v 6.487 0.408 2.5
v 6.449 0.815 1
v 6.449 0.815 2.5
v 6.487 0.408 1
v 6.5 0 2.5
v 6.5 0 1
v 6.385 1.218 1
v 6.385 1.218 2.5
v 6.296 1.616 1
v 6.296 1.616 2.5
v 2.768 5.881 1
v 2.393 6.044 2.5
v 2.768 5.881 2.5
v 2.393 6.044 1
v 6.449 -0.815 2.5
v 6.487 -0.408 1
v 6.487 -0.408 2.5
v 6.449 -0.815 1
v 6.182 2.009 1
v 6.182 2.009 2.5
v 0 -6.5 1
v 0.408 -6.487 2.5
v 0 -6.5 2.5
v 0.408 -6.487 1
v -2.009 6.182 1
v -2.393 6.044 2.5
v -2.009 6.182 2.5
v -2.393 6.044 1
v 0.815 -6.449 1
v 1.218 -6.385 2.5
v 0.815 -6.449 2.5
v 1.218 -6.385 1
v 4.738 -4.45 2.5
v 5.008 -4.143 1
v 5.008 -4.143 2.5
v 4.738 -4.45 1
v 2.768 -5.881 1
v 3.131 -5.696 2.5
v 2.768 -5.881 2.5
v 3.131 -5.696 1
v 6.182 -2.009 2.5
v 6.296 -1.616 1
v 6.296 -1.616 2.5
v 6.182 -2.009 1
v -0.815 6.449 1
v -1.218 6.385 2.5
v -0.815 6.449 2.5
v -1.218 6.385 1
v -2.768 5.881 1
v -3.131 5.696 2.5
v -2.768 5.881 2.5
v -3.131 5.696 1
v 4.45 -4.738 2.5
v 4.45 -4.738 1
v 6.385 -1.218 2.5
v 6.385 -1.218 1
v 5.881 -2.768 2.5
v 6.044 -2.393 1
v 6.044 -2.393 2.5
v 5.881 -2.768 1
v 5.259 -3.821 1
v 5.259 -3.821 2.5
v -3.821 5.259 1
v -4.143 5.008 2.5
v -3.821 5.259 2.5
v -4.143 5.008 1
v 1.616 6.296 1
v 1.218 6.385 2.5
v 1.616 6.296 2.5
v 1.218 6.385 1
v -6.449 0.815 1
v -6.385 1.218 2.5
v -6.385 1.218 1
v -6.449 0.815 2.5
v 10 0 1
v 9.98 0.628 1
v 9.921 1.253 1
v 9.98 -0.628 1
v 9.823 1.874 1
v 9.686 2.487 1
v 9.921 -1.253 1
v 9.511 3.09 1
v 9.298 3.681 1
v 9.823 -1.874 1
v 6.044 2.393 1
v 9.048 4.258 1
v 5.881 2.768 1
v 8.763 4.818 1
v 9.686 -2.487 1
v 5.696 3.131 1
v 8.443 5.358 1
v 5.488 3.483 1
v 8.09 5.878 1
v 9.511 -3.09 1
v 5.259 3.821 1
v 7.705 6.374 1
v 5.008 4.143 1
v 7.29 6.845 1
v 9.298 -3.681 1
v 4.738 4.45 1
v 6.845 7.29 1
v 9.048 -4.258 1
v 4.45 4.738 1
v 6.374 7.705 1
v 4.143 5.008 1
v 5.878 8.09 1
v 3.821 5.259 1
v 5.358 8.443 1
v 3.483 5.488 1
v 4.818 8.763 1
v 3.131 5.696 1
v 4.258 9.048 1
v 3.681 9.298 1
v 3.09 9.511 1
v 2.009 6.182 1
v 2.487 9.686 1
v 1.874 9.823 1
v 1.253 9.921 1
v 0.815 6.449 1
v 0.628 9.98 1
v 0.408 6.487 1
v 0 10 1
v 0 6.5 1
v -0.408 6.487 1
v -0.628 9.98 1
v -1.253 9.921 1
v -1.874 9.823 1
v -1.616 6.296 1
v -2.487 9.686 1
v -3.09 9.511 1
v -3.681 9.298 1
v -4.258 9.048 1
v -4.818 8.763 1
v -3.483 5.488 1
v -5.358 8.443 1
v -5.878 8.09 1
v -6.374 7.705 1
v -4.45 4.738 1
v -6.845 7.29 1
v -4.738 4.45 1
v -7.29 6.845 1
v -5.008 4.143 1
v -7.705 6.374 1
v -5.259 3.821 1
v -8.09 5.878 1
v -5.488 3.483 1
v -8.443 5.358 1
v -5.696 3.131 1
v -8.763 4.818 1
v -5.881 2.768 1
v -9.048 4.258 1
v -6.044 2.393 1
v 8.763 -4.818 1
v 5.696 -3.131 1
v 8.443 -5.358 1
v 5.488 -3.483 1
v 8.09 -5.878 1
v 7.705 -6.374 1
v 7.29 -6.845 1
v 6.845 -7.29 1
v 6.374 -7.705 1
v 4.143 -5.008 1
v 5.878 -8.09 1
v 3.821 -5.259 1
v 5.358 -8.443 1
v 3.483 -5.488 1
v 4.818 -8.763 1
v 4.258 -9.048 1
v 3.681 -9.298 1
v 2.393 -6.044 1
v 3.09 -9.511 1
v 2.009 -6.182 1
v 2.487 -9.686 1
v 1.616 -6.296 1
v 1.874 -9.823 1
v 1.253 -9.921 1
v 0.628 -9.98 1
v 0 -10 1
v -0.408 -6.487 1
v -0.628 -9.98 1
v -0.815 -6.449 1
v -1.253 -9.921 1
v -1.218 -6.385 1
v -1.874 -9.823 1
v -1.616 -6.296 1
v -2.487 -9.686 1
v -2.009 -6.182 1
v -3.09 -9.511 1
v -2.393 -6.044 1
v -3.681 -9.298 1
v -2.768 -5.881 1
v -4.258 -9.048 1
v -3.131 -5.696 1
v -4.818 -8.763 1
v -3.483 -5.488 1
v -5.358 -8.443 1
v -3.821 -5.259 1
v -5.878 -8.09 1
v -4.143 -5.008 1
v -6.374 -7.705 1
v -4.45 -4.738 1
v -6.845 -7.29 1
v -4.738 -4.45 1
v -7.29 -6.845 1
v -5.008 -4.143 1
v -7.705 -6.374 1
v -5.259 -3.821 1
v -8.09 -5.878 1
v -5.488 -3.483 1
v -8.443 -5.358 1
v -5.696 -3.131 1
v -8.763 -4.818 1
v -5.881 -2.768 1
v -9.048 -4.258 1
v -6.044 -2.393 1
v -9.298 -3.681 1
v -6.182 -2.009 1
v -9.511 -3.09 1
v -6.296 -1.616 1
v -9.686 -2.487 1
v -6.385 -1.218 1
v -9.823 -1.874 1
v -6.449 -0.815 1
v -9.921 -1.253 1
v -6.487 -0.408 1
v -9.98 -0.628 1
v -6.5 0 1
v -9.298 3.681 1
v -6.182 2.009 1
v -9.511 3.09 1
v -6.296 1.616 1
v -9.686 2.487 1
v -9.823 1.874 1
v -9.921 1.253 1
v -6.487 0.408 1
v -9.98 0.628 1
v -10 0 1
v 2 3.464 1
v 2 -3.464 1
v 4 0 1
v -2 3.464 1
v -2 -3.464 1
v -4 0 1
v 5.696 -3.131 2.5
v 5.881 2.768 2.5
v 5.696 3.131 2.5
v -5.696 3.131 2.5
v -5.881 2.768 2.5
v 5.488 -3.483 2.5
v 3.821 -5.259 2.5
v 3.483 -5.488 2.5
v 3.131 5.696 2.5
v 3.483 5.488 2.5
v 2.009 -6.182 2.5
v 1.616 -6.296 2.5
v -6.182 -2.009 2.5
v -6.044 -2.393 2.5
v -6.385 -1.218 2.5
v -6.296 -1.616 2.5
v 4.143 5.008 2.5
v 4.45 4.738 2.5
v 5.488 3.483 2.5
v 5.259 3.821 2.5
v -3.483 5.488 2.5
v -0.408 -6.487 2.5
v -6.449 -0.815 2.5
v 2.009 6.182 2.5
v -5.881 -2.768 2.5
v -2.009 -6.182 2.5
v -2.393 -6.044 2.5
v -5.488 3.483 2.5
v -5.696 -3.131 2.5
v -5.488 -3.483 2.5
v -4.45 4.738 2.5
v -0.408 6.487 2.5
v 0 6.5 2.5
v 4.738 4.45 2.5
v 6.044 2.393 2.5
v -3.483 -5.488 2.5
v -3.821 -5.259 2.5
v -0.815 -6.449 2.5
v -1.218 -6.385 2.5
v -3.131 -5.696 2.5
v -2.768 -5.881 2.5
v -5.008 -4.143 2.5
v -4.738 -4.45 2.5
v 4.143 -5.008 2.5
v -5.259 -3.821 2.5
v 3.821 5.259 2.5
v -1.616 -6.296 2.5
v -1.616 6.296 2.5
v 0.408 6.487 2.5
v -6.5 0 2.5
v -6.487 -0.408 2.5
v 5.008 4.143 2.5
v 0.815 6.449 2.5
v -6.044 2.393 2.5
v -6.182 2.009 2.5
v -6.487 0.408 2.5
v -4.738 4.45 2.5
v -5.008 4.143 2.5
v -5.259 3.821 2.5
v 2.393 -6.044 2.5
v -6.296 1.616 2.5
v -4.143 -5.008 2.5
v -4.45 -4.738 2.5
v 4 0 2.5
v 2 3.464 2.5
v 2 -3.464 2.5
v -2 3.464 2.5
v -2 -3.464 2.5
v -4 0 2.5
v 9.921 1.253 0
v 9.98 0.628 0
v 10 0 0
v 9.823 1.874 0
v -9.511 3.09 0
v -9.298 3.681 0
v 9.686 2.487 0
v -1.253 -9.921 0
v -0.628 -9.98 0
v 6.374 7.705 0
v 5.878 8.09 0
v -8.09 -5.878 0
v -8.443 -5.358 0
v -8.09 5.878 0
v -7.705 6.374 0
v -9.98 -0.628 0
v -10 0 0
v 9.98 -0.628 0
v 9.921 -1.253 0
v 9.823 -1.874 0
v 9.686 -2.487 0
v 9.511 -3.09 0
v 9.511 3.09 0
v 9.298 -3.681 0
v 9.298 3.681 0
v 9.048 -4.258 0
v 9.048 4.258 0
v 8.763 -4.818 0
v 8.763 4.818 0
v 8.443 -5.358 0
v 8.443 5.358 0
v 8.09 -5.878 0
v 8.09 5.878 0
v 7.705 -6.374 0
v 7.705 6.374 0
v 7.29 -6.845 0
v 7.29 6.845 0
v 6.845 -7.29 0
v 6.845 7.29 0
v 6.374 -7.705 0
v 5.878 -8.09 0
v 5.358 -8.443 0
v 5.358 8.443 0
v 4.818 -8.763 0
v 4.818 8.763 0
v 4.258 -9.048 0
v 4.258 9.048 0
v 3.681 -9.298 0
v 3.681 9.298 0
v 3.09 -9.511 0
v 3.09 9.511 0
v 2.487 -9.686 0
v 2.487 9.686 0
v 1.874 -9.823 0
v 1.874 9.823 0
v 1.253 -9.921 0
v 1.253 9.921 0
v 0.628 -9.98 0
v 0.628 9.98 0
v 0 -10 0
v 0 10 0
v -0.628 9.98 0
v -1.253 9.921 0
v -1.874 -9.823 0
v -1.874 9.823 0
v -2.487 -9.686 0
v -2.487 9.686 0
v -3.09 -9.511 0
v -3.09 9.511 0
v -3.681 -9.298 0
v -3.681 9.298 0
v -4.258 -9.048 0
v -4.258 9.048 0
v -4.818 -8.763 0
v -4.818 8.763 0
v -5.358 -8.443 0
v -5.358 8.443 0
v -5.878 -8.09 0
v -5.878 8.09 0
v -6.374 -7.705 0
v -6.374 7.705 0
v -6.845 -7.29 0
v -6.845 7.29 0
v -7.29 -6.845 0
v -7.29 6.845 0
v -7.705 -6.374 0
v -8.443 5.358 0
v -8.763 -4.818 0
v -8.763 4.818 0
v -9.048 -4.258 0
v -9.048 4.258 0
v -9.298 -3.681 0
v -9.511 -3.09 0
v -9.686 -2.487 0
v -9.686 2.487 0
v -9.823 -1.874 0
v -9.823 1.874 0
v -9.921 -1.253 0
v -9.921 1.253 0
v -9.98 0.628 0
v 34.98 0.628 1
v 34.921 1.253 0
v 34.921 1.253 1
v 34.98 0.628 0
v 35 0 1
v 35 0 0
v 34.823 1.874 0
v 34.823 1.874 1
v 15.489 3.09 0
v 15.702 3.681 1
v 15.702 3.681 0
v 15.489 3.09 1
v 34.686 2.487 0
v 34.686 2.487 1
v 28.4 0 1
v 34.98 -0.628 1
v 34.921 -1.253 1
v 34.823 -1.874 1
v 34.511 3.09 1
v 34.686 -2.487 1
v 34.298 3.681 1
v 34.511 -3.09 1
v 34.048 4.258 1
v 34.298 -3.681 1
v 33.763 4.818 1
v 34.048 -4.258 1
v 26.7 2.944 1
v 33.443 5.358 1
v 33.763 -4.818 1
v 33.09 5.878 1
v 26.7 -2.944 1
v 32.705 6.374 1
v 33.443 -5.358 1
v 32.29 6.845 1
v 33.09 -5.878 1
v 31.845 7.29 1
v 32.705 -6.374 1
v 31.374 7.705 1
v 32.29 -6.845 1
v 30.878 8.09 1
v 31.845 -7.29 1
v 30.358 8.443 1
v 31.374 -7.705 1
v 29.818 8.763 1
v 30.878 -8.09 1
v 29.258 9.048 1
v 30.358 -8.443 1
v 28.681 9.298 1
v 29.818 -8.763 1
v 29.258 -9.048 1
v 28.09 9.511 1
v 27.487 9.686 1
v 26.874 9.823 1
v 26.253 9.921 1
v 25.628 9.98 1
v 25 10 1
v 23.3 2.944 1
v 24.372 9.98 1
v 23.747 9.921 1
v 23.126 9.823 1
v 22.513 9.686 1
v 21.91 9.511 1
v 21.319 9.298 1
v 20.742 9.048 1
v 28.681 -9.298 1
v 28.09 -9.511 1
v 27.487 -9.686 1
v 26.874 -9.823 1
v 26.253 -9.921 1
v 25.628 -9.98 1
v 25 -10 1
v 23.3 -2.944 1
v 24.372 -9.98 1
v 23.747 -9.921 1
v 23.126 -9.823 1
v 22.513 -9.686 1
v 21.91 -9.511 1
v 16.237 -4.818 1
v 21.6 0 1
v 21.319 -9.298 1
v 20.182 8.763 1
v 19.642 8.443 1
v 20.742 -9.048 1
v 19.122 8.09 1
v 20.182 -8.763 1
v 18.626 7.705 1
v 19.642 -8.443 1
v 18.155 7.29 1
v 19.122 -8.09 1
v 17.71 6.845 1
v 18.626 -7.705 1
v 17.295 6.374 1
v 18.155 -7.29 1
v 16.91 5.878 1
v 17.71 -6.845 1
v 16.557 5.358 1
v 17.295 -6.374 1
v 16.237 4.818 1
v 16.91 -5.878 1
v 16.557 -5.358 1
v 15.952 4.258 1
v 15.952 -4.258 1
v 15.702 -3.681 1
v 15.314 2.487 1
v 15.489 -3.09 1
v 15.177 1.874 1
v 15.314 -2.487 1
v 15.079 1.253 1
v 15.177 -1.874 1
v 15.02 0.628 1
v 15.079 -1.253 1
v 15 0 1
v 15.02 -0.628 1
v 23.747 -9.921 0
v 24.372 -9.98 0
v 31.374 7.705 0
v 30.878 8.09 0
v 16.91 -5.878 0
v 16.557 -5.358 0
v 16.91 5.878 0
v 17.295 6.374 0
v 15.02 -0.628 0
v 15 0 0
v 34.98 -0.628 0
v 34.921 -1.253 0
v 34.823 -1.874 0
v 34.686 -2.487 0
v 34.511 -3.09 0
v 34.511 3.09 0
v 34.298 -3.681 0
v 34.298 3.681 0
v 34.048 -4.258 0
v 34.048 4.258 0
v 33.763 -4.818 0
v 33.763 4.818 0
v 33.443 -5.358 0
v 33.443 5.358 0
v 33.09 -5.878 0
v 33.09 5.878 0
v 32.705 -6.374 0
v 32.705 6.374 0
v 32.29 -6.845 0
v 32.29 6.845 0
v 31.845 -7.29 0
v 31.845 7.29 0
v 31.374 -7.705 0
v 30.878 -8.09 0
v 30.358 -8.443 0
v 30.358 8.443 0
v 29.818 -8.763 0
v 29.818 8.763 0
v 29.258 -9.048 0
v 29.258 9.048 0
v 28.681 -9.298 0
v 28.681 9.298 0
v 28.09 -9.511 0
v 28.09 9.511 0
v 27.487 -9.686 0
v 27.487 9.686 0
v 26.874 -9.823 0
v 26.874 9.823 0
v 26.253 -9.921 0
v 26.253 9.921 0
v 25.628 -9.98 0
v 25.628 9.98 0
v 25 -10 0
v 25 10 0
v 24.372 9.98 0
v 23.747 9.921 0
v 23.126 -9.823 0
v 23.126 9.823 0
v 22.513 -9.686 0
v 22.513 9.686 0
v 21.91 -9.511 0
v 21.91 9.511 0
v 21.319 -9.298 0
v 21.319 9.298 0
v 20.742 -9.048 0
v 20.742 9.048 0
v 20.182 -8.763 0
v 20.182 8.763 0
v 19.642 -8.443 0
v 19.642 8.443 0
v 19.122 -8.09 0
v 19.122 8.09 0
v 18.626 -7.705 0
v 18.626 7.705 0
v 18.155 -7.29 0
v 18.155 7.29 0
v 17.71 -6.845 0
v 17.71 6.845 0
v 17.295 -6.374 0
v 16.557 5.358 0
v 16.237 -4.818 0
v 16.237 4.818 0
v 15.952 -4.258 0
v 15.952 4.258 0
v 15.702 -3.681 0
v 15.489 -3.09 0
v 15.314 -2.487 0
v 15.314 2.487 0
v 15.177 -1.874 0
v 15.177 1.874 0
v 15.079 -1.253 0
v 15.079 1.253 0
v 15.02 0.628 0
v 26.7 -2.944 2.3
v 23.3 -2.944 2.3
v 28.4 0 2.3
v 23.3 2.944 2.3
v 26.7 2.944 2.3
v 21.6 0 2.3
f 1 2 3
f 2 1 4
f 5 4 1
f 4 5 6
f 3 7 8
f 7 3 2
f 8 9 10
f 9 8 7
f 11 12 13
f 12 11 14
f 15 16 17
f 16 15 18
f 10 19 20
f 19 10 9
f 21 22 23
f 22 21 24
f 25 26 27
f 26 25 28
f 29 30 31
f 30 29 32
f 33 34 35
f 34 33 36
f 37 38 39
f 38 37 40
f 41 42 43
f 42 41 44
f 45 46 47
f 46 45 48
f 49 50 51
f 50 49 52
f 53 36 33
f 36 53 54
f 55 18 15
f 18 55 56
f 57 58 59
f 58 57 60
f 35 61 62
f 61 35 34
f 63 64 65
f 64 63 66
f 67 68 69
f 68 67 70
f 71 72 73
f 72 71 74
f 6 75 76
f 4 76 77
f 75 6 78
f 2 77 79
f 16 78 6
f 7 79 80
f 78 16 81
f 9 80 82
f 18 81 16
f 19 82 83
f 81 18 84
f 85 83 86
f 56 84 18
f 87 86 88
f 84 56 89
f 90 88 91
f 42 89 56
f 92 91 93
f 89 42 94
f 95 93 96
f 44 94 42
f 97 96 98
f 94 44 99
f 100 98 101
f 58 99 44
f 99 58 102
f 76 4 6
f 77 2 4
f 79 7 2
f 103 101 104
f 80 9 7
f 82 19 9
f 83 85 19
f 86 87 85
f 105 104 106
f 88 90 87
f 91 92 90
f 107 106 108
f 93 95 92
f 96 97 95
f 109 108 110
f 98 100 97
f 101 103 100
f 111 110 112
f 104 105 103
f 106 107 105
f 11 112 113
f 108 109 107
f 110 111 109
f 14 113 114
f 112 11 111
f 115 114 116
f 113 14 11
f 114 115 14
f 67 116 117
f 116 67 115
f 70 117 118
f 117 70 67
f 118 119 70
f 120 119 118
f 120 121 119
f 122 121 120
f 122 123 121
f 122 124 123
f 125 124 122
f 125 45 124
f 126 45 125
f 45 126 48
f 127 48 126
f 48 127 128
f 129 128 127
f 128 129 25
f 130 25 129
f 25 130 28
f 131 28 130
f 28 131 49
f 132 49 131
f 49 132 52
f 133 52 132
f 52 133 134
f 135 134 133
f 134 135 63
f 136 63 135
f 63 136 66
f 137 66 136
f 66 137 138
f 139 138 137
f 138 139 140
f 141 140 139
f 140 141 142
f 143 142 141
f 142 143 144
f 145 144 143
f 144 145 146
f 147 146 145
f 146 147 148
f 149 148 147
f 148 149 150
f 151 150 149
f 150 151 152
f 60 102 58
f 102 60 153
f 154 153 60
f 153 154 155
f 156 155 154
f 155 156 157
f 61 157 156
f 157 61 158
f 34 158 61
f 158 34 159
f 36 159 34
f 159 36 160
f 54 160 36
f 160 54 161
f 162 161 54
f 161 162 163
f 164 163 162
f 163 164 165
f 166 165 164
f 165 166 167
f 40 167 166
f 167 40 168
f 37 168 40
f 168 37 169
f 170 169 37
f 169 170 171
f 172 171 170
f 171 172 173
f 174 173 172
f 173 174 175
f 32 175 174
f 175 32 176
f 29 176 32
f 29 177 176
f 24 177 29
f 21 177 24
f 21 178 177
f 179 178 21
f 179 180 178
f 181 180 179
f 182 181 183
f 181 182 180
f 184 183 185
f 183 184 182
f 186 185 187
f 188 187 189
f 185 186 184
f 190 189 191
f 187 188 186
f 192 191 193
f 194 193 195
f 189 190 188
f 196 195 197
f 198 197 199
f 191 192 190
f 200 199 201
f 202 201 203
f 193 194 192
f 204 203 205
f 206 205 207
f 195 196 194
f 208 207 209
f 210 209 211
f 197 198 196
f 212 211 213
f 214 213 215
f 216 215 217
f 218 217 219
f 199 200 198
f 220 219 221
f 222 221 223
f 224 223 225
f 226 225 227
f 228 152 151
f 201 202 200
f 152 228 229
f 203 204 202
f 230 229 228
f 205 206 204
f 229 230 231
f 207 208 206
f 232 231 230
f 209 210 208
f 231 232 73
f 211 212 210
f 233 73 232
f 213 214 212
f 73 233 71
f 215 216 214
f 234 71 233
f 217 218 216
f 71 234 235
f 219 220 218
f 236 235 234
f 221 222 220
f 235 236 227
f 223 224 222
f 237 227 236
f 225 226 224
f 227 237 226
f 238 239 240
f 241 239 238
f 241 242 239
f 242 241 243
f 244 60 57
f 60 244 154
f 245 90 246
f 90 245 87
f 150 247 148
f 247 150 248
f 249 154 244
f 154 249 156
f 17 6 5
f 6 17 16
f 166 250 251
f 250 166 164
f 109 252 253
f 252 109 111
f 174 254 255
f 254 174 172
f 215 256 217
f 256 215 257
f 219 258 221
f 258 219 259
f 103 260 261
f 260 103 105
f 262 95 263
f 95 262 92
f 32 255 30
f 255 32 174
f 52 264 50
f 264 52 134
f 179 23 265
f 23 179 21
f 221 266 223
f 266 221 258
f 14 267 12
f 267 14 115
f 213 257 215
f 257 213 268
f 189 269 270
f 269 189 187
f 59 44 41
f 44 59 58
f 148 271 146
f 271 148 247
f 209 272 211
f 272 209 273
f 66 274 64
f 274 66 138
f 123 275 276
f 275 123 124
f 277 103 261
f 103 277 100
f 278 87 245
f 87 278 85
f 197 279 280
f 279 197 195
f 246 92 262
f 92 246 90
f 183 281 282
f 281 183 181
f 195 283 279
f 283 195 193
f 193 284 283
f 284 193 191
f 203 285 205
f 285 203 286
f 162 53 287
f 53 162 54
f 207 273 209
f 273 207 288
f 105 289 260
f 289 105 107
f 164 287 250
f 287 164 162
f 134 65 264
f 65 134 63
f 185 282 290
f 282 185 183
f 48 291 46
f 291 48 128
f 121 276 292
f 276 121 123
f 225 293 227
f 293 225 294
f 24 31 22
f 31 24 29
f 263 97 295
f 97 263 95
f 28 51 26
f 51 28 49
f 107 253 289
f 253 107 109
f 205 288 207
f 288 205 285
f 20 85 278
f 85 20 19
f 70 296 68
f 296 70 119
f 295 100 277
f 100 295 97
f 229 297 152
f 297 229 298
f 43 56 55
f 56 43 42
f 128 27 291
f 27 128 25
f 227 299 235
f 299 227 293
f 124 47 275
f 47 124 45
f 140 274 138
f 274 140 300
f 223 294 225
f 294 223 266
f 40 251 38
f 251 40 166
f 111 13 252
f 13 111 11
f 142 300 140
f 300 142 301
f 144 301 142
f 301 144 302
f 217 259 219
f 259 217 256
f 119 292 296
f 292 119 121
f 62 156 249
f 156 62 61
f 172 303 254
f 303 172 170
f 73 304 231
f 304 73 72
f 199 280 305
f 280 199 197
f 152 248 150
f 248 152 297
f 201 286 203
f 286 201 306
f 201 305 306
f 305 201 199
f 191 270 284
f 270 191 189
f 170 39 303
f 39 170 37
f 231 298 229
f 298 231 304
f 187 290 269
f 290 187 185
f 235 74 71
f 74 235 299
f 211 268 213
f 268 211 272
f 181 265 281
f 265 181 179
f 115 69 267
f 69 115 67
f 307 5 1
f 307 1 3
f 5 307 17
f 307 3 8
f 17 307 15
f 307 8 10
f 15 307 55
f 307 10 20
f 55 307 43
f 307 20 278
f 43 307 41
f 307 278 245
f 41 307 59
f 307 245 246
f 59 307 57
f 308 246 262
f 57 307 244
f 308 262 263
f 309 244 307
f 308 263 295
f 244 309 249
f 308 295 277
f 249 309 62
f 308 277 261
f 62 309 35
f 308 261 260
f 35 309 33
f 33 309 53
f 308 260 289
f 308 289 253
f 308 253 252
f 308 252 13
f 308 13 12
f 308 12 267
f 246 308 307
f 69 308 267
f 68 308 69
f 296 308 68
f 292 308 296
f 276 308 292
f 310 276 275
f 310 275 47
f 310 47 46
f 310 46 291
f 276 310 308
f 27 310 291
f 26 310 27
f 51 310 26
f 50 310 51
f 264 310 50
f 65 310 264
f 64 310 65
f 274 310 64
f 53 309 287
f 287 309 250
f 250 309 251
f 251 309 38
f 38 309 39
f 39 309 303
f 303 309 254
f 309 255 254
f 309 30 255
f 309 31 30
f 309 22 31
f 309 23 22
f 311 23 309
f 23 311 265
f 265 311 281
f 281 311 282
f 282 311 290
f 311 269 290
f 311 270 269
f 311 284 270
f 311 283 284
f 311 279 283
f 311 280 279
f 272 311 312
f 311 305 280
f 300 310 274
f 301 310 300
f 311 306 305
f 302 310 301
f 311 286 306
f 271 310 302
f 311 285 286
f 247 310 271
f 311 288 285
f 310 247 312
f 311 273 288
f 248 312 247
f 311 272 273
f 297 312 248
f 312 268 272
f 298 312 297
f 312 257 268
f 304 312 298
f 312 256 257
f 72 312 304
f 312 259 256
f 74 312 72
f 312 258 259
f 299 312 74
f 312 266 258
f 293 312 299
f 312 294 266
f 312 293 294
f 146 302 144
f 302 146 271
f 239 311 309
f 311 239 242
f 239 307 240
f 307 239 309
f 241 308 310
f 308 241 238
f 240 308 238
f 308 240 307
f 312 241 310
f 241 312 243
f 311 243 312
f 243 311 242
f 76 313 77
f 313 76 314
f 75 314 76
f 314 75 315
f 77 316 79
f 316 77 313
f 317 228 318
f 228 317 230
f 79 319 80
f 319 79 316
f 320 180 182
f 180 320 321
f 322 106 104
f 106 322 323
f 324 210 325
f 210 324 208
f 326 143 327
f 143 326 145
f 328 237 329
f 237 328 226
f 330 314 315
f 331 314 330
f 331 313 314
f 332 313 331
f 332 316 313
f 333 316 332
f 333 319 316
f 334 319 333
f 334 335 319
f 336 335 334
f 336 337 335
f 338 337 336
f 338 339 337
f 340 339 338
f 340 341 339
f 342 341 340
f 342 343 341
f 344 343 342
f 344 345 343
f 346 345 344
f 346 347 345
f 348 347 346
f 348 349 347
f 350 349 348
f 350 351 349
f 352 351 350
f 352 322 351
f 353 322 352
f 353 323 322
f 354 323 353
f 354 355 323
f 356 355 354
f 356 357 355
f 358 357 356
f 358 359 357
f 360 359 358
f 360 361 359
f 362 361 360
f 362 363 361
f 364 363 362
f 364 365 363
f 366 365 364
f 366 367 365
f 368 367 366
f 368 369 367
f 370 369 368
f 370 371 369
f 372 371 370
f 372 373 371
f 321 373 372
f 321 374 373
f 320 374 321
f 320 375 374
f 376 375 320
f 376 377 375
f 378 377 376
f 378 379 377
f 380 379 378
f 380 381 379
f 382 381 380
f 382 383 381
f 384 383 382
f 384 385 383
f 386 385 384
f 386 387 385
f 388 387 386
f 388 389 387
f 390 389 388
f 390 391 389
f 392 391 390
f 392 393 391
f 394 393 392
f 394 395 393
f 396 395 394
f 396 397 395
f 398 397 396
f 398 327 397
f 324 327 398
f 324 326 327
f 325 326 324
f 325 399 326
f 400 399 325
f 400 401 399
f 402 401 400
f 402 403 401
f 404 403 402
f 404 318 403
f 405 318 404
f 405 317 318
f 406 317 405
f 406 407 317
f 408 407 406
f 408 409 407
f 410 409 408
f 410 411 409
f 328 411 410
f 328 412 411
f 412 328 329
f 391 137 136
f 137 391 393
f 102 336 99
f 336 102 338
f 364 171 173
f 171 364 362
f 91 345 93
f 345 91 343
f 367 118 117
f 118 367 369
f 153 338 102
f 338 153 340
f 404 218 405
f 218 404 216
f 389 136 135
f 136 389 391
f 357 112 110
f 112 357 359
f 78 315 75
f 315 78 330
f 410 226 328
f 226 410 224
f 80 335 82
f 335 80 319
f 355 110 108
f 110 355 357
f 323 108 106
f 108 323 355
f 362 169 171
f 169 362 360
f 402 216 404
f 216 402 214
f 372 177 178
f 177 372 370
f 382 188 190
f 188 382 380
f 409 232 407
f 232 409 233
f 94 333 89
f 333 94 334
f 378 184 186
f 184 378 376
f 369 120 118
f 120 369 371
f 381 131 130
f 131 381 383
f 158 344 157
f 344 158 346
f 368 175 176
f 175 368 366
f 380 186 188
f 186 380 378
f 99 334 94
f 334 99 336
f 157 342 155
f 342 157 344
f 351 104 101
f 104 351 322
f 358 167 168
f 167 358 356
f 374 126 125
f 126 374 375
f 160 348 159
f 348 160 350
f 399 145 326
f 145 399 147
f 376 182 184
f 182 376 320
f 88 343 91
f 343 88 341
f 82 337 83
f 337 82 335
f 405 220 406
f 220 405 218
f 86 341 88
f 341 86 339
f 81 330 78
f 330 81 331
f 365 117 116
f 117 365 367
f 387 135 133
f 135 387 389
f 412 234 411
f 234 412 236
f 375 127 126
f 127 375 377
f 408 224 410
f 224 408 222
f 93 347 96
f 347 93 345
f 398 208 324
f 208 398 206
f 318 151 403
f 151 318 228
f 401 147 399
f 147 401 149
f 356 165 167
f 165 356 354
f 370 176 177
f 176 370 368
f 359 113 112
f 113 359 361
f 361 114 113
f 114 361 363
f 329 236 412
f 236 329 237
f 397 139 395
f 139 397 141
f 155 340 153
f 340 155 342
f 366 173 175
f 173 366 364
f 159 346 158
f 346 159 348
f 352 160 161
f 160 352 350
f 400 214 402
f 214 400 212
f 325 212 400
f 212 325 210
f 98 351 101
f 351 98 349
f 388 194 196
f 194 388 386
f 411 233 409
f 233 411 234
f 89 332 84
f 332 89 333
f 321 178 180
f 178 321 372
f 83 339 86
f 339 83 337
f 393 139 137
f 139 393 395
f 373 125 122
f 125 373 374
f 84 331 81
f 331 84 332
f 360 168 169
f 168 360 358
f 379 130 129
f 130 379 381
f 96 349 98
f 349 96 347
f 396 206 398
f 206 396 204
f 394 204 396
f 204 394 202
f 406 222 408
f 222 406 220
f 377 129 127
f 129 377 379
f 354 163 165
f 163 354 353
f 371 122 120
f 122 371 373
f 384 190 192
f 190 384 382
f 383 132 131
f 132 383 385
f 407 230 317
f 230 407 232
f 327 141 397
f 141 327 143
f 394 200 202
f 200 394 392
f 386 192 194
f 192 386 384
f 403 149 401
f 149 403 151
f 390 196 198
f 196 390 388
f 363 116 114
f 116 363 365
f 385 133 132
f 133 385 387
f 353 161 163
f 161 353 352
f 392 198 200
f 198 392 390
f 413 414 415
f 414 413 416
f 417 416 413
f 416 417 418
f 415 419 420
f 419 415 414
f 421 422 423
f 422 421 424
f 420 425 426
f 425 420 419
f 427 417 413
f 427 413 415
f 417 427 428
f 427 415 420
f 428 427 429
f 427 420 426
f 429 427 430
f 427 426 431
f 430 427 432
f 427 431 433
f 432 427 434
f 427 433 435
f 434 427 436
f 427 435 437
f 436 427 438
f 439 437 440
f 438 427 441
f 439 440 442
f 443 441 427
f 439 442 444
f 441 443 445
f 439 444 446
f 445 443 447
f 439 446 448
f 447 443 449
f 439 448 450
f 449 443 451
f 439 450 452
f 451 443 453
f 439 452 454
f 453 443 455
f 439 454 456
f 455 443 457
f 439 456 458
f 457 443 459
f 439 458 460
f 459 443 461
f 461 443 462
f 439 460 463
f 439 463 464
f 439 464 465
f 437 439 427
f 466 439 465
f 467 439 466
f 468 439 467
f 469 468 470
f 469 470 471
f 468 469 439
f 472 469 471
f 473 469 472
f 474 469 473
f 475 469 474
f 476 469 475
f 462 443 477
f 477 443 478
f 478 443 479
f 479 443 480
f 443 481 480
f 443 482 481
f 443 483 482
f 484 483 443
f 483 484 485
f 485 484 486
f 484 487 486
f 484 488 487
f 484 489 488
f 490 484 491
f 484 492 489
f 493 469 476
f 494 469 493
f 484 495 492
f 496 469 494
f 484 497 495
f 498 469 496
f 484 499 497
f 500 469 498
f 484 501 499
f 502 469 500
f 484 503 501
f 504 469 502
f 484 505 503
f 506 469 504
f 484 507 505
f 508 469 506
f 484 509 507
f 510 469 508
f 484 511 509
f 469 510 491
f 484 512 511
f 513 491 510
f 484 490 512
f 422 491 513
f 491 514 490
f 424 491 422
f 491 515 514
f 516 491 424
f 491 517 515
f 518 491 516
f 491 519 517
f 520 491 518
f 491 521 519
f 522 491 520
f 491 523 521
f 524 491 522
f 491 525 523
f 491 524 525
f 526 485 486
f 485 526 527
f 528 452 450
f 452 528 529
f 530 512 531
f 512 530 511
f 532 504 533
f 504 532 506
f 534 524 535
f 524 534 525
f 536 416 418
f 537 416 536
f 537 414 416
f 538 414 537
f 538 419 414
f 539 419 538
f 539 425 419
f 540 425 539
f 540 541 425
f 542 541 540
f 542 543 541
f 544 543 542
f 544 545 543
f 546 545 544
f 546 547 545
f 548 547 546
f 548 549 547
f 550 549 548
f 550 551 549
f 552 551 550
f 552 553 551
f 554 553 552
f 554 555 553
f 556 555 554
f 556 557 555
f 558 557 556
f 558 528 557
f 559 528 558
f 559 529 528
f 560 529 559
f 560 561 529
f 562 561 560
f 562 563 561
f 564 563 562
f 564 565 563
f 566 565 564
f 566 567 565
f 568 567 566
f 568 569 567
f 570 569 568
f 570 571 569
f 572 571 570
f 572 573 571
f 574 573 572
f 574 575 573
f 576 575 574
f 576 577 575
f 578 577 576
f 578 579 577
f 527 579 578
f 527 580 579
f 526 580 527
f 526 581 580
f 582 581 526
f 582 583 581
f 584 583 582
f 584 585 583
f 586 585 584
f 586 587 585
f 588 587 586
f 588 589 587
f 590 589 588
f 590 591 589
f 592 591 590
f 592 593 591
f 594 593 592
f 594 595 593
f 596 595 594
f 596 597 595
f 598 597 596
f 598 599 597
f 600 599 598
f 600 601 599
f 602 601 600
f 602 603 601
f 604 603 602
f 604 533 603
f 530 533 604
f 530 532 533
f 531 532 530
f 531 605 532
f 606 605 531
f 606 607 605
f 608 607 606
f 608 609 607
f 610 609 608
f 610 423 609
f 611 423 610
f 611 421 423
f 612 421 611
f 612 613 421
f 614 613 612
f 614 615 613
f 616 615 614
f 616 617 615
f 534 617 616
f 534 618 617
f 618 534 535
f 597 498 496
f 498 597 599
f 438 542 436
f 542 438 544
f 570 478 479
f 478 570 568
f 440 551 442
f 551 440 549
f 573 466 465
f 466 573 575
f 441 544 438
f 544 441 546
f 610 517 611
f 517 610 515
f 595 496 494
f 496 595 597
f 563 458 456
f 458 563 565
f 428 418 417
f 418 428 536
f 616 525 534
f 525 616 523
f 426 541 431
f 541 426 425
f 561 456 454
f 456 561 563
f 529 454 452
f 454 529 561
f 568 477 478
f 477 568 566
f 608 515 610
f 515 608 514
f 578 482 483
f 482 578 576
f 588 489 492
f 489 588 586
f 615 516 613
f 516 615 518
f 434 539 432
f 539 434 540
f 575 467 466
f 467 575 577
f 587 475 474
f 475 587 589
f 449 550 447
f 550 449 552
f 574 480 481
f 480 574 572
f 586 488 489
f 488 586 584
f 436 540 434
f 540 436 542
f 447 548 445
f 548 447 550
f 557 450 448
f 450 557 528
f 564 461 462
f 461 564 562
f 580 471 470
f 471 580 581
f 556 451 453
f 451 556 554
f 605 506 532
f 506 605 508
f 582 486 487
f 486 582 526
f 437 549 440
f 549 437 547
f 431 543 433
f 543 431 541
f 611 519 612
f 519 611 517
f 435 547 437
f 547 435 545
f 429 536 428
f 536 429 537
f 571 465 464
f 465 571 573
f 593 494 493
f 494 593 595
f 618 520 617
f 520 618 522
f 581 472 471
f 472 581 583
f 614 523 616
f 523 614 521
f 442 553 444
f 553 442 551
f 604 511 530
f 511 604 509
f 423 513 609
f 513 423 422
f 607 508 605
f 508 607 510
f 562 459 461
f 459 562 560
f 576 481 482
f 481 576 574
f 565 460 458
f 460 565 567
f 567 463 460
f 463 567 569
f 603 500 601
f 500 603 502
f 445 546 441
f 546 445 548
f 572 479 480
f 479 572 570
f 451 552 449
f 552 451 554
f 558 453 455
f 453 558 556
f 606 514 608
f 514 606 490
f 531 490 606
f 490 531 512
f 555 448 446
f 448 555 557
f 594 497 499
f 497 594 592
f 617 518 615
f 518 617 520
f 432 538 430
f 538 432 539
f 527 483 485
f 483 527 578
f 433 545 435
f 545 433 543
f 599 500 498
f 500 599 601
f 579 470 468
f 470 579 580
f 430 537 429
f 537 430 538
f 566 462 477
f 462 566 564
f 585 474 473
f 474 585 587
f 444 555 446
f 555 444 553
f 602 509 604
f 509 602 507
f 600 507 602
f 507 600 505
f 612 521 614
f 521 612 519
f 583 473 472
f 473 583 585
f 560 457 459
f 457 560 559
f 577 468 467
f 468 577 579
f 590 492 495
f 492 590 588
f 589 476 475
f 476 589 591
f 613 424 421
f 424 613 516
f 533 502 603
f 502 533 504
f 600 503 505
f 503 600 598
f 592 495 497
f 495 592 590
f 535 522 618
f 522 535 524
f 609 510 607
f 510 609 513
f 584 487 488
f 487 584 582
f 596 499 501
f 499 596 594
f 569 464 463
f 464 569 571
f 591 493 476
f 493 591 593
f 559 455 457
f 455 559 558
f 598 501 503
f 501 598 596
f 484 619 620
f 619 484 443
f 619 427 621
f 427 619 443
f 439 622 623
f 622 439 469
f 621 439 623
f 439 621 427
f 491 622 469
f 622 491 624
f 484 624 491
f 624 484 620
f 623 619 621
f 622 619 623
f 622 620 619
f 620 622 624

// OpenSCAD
outer_radius = 10;
inner_radius = 6.5;
lock_radius = 4;
lock_tolerance = 1.2;
lock_height_tolerance = 0.2;

knob_thickness = 1;
lock_thickness = 1.5;

module outer() {
  cylinder(h=knob_thickness, r=outer_radius, $fn=100);

  translate([0, 0, knob_thickness])
    render() difference() {
        cylinder(h=lock_thickness, r=inner_radius, $fn=100);

        cylinder(h=lock_thickness, r=lock_radius, $fn=6);
      }
}

module inner() {
  cylinder(h=knob_thickness, r=outer_radius, $fn=100);

  translate([0, 0, knob_thickness])
    cylinder(h=lock_thickness - lock_height_tolerance, r=lock_radius - (lock_tolerance / 2), $fn=6);
}

outer();

translate([2.5 * outer_radius, 0, 0])
  inner();
